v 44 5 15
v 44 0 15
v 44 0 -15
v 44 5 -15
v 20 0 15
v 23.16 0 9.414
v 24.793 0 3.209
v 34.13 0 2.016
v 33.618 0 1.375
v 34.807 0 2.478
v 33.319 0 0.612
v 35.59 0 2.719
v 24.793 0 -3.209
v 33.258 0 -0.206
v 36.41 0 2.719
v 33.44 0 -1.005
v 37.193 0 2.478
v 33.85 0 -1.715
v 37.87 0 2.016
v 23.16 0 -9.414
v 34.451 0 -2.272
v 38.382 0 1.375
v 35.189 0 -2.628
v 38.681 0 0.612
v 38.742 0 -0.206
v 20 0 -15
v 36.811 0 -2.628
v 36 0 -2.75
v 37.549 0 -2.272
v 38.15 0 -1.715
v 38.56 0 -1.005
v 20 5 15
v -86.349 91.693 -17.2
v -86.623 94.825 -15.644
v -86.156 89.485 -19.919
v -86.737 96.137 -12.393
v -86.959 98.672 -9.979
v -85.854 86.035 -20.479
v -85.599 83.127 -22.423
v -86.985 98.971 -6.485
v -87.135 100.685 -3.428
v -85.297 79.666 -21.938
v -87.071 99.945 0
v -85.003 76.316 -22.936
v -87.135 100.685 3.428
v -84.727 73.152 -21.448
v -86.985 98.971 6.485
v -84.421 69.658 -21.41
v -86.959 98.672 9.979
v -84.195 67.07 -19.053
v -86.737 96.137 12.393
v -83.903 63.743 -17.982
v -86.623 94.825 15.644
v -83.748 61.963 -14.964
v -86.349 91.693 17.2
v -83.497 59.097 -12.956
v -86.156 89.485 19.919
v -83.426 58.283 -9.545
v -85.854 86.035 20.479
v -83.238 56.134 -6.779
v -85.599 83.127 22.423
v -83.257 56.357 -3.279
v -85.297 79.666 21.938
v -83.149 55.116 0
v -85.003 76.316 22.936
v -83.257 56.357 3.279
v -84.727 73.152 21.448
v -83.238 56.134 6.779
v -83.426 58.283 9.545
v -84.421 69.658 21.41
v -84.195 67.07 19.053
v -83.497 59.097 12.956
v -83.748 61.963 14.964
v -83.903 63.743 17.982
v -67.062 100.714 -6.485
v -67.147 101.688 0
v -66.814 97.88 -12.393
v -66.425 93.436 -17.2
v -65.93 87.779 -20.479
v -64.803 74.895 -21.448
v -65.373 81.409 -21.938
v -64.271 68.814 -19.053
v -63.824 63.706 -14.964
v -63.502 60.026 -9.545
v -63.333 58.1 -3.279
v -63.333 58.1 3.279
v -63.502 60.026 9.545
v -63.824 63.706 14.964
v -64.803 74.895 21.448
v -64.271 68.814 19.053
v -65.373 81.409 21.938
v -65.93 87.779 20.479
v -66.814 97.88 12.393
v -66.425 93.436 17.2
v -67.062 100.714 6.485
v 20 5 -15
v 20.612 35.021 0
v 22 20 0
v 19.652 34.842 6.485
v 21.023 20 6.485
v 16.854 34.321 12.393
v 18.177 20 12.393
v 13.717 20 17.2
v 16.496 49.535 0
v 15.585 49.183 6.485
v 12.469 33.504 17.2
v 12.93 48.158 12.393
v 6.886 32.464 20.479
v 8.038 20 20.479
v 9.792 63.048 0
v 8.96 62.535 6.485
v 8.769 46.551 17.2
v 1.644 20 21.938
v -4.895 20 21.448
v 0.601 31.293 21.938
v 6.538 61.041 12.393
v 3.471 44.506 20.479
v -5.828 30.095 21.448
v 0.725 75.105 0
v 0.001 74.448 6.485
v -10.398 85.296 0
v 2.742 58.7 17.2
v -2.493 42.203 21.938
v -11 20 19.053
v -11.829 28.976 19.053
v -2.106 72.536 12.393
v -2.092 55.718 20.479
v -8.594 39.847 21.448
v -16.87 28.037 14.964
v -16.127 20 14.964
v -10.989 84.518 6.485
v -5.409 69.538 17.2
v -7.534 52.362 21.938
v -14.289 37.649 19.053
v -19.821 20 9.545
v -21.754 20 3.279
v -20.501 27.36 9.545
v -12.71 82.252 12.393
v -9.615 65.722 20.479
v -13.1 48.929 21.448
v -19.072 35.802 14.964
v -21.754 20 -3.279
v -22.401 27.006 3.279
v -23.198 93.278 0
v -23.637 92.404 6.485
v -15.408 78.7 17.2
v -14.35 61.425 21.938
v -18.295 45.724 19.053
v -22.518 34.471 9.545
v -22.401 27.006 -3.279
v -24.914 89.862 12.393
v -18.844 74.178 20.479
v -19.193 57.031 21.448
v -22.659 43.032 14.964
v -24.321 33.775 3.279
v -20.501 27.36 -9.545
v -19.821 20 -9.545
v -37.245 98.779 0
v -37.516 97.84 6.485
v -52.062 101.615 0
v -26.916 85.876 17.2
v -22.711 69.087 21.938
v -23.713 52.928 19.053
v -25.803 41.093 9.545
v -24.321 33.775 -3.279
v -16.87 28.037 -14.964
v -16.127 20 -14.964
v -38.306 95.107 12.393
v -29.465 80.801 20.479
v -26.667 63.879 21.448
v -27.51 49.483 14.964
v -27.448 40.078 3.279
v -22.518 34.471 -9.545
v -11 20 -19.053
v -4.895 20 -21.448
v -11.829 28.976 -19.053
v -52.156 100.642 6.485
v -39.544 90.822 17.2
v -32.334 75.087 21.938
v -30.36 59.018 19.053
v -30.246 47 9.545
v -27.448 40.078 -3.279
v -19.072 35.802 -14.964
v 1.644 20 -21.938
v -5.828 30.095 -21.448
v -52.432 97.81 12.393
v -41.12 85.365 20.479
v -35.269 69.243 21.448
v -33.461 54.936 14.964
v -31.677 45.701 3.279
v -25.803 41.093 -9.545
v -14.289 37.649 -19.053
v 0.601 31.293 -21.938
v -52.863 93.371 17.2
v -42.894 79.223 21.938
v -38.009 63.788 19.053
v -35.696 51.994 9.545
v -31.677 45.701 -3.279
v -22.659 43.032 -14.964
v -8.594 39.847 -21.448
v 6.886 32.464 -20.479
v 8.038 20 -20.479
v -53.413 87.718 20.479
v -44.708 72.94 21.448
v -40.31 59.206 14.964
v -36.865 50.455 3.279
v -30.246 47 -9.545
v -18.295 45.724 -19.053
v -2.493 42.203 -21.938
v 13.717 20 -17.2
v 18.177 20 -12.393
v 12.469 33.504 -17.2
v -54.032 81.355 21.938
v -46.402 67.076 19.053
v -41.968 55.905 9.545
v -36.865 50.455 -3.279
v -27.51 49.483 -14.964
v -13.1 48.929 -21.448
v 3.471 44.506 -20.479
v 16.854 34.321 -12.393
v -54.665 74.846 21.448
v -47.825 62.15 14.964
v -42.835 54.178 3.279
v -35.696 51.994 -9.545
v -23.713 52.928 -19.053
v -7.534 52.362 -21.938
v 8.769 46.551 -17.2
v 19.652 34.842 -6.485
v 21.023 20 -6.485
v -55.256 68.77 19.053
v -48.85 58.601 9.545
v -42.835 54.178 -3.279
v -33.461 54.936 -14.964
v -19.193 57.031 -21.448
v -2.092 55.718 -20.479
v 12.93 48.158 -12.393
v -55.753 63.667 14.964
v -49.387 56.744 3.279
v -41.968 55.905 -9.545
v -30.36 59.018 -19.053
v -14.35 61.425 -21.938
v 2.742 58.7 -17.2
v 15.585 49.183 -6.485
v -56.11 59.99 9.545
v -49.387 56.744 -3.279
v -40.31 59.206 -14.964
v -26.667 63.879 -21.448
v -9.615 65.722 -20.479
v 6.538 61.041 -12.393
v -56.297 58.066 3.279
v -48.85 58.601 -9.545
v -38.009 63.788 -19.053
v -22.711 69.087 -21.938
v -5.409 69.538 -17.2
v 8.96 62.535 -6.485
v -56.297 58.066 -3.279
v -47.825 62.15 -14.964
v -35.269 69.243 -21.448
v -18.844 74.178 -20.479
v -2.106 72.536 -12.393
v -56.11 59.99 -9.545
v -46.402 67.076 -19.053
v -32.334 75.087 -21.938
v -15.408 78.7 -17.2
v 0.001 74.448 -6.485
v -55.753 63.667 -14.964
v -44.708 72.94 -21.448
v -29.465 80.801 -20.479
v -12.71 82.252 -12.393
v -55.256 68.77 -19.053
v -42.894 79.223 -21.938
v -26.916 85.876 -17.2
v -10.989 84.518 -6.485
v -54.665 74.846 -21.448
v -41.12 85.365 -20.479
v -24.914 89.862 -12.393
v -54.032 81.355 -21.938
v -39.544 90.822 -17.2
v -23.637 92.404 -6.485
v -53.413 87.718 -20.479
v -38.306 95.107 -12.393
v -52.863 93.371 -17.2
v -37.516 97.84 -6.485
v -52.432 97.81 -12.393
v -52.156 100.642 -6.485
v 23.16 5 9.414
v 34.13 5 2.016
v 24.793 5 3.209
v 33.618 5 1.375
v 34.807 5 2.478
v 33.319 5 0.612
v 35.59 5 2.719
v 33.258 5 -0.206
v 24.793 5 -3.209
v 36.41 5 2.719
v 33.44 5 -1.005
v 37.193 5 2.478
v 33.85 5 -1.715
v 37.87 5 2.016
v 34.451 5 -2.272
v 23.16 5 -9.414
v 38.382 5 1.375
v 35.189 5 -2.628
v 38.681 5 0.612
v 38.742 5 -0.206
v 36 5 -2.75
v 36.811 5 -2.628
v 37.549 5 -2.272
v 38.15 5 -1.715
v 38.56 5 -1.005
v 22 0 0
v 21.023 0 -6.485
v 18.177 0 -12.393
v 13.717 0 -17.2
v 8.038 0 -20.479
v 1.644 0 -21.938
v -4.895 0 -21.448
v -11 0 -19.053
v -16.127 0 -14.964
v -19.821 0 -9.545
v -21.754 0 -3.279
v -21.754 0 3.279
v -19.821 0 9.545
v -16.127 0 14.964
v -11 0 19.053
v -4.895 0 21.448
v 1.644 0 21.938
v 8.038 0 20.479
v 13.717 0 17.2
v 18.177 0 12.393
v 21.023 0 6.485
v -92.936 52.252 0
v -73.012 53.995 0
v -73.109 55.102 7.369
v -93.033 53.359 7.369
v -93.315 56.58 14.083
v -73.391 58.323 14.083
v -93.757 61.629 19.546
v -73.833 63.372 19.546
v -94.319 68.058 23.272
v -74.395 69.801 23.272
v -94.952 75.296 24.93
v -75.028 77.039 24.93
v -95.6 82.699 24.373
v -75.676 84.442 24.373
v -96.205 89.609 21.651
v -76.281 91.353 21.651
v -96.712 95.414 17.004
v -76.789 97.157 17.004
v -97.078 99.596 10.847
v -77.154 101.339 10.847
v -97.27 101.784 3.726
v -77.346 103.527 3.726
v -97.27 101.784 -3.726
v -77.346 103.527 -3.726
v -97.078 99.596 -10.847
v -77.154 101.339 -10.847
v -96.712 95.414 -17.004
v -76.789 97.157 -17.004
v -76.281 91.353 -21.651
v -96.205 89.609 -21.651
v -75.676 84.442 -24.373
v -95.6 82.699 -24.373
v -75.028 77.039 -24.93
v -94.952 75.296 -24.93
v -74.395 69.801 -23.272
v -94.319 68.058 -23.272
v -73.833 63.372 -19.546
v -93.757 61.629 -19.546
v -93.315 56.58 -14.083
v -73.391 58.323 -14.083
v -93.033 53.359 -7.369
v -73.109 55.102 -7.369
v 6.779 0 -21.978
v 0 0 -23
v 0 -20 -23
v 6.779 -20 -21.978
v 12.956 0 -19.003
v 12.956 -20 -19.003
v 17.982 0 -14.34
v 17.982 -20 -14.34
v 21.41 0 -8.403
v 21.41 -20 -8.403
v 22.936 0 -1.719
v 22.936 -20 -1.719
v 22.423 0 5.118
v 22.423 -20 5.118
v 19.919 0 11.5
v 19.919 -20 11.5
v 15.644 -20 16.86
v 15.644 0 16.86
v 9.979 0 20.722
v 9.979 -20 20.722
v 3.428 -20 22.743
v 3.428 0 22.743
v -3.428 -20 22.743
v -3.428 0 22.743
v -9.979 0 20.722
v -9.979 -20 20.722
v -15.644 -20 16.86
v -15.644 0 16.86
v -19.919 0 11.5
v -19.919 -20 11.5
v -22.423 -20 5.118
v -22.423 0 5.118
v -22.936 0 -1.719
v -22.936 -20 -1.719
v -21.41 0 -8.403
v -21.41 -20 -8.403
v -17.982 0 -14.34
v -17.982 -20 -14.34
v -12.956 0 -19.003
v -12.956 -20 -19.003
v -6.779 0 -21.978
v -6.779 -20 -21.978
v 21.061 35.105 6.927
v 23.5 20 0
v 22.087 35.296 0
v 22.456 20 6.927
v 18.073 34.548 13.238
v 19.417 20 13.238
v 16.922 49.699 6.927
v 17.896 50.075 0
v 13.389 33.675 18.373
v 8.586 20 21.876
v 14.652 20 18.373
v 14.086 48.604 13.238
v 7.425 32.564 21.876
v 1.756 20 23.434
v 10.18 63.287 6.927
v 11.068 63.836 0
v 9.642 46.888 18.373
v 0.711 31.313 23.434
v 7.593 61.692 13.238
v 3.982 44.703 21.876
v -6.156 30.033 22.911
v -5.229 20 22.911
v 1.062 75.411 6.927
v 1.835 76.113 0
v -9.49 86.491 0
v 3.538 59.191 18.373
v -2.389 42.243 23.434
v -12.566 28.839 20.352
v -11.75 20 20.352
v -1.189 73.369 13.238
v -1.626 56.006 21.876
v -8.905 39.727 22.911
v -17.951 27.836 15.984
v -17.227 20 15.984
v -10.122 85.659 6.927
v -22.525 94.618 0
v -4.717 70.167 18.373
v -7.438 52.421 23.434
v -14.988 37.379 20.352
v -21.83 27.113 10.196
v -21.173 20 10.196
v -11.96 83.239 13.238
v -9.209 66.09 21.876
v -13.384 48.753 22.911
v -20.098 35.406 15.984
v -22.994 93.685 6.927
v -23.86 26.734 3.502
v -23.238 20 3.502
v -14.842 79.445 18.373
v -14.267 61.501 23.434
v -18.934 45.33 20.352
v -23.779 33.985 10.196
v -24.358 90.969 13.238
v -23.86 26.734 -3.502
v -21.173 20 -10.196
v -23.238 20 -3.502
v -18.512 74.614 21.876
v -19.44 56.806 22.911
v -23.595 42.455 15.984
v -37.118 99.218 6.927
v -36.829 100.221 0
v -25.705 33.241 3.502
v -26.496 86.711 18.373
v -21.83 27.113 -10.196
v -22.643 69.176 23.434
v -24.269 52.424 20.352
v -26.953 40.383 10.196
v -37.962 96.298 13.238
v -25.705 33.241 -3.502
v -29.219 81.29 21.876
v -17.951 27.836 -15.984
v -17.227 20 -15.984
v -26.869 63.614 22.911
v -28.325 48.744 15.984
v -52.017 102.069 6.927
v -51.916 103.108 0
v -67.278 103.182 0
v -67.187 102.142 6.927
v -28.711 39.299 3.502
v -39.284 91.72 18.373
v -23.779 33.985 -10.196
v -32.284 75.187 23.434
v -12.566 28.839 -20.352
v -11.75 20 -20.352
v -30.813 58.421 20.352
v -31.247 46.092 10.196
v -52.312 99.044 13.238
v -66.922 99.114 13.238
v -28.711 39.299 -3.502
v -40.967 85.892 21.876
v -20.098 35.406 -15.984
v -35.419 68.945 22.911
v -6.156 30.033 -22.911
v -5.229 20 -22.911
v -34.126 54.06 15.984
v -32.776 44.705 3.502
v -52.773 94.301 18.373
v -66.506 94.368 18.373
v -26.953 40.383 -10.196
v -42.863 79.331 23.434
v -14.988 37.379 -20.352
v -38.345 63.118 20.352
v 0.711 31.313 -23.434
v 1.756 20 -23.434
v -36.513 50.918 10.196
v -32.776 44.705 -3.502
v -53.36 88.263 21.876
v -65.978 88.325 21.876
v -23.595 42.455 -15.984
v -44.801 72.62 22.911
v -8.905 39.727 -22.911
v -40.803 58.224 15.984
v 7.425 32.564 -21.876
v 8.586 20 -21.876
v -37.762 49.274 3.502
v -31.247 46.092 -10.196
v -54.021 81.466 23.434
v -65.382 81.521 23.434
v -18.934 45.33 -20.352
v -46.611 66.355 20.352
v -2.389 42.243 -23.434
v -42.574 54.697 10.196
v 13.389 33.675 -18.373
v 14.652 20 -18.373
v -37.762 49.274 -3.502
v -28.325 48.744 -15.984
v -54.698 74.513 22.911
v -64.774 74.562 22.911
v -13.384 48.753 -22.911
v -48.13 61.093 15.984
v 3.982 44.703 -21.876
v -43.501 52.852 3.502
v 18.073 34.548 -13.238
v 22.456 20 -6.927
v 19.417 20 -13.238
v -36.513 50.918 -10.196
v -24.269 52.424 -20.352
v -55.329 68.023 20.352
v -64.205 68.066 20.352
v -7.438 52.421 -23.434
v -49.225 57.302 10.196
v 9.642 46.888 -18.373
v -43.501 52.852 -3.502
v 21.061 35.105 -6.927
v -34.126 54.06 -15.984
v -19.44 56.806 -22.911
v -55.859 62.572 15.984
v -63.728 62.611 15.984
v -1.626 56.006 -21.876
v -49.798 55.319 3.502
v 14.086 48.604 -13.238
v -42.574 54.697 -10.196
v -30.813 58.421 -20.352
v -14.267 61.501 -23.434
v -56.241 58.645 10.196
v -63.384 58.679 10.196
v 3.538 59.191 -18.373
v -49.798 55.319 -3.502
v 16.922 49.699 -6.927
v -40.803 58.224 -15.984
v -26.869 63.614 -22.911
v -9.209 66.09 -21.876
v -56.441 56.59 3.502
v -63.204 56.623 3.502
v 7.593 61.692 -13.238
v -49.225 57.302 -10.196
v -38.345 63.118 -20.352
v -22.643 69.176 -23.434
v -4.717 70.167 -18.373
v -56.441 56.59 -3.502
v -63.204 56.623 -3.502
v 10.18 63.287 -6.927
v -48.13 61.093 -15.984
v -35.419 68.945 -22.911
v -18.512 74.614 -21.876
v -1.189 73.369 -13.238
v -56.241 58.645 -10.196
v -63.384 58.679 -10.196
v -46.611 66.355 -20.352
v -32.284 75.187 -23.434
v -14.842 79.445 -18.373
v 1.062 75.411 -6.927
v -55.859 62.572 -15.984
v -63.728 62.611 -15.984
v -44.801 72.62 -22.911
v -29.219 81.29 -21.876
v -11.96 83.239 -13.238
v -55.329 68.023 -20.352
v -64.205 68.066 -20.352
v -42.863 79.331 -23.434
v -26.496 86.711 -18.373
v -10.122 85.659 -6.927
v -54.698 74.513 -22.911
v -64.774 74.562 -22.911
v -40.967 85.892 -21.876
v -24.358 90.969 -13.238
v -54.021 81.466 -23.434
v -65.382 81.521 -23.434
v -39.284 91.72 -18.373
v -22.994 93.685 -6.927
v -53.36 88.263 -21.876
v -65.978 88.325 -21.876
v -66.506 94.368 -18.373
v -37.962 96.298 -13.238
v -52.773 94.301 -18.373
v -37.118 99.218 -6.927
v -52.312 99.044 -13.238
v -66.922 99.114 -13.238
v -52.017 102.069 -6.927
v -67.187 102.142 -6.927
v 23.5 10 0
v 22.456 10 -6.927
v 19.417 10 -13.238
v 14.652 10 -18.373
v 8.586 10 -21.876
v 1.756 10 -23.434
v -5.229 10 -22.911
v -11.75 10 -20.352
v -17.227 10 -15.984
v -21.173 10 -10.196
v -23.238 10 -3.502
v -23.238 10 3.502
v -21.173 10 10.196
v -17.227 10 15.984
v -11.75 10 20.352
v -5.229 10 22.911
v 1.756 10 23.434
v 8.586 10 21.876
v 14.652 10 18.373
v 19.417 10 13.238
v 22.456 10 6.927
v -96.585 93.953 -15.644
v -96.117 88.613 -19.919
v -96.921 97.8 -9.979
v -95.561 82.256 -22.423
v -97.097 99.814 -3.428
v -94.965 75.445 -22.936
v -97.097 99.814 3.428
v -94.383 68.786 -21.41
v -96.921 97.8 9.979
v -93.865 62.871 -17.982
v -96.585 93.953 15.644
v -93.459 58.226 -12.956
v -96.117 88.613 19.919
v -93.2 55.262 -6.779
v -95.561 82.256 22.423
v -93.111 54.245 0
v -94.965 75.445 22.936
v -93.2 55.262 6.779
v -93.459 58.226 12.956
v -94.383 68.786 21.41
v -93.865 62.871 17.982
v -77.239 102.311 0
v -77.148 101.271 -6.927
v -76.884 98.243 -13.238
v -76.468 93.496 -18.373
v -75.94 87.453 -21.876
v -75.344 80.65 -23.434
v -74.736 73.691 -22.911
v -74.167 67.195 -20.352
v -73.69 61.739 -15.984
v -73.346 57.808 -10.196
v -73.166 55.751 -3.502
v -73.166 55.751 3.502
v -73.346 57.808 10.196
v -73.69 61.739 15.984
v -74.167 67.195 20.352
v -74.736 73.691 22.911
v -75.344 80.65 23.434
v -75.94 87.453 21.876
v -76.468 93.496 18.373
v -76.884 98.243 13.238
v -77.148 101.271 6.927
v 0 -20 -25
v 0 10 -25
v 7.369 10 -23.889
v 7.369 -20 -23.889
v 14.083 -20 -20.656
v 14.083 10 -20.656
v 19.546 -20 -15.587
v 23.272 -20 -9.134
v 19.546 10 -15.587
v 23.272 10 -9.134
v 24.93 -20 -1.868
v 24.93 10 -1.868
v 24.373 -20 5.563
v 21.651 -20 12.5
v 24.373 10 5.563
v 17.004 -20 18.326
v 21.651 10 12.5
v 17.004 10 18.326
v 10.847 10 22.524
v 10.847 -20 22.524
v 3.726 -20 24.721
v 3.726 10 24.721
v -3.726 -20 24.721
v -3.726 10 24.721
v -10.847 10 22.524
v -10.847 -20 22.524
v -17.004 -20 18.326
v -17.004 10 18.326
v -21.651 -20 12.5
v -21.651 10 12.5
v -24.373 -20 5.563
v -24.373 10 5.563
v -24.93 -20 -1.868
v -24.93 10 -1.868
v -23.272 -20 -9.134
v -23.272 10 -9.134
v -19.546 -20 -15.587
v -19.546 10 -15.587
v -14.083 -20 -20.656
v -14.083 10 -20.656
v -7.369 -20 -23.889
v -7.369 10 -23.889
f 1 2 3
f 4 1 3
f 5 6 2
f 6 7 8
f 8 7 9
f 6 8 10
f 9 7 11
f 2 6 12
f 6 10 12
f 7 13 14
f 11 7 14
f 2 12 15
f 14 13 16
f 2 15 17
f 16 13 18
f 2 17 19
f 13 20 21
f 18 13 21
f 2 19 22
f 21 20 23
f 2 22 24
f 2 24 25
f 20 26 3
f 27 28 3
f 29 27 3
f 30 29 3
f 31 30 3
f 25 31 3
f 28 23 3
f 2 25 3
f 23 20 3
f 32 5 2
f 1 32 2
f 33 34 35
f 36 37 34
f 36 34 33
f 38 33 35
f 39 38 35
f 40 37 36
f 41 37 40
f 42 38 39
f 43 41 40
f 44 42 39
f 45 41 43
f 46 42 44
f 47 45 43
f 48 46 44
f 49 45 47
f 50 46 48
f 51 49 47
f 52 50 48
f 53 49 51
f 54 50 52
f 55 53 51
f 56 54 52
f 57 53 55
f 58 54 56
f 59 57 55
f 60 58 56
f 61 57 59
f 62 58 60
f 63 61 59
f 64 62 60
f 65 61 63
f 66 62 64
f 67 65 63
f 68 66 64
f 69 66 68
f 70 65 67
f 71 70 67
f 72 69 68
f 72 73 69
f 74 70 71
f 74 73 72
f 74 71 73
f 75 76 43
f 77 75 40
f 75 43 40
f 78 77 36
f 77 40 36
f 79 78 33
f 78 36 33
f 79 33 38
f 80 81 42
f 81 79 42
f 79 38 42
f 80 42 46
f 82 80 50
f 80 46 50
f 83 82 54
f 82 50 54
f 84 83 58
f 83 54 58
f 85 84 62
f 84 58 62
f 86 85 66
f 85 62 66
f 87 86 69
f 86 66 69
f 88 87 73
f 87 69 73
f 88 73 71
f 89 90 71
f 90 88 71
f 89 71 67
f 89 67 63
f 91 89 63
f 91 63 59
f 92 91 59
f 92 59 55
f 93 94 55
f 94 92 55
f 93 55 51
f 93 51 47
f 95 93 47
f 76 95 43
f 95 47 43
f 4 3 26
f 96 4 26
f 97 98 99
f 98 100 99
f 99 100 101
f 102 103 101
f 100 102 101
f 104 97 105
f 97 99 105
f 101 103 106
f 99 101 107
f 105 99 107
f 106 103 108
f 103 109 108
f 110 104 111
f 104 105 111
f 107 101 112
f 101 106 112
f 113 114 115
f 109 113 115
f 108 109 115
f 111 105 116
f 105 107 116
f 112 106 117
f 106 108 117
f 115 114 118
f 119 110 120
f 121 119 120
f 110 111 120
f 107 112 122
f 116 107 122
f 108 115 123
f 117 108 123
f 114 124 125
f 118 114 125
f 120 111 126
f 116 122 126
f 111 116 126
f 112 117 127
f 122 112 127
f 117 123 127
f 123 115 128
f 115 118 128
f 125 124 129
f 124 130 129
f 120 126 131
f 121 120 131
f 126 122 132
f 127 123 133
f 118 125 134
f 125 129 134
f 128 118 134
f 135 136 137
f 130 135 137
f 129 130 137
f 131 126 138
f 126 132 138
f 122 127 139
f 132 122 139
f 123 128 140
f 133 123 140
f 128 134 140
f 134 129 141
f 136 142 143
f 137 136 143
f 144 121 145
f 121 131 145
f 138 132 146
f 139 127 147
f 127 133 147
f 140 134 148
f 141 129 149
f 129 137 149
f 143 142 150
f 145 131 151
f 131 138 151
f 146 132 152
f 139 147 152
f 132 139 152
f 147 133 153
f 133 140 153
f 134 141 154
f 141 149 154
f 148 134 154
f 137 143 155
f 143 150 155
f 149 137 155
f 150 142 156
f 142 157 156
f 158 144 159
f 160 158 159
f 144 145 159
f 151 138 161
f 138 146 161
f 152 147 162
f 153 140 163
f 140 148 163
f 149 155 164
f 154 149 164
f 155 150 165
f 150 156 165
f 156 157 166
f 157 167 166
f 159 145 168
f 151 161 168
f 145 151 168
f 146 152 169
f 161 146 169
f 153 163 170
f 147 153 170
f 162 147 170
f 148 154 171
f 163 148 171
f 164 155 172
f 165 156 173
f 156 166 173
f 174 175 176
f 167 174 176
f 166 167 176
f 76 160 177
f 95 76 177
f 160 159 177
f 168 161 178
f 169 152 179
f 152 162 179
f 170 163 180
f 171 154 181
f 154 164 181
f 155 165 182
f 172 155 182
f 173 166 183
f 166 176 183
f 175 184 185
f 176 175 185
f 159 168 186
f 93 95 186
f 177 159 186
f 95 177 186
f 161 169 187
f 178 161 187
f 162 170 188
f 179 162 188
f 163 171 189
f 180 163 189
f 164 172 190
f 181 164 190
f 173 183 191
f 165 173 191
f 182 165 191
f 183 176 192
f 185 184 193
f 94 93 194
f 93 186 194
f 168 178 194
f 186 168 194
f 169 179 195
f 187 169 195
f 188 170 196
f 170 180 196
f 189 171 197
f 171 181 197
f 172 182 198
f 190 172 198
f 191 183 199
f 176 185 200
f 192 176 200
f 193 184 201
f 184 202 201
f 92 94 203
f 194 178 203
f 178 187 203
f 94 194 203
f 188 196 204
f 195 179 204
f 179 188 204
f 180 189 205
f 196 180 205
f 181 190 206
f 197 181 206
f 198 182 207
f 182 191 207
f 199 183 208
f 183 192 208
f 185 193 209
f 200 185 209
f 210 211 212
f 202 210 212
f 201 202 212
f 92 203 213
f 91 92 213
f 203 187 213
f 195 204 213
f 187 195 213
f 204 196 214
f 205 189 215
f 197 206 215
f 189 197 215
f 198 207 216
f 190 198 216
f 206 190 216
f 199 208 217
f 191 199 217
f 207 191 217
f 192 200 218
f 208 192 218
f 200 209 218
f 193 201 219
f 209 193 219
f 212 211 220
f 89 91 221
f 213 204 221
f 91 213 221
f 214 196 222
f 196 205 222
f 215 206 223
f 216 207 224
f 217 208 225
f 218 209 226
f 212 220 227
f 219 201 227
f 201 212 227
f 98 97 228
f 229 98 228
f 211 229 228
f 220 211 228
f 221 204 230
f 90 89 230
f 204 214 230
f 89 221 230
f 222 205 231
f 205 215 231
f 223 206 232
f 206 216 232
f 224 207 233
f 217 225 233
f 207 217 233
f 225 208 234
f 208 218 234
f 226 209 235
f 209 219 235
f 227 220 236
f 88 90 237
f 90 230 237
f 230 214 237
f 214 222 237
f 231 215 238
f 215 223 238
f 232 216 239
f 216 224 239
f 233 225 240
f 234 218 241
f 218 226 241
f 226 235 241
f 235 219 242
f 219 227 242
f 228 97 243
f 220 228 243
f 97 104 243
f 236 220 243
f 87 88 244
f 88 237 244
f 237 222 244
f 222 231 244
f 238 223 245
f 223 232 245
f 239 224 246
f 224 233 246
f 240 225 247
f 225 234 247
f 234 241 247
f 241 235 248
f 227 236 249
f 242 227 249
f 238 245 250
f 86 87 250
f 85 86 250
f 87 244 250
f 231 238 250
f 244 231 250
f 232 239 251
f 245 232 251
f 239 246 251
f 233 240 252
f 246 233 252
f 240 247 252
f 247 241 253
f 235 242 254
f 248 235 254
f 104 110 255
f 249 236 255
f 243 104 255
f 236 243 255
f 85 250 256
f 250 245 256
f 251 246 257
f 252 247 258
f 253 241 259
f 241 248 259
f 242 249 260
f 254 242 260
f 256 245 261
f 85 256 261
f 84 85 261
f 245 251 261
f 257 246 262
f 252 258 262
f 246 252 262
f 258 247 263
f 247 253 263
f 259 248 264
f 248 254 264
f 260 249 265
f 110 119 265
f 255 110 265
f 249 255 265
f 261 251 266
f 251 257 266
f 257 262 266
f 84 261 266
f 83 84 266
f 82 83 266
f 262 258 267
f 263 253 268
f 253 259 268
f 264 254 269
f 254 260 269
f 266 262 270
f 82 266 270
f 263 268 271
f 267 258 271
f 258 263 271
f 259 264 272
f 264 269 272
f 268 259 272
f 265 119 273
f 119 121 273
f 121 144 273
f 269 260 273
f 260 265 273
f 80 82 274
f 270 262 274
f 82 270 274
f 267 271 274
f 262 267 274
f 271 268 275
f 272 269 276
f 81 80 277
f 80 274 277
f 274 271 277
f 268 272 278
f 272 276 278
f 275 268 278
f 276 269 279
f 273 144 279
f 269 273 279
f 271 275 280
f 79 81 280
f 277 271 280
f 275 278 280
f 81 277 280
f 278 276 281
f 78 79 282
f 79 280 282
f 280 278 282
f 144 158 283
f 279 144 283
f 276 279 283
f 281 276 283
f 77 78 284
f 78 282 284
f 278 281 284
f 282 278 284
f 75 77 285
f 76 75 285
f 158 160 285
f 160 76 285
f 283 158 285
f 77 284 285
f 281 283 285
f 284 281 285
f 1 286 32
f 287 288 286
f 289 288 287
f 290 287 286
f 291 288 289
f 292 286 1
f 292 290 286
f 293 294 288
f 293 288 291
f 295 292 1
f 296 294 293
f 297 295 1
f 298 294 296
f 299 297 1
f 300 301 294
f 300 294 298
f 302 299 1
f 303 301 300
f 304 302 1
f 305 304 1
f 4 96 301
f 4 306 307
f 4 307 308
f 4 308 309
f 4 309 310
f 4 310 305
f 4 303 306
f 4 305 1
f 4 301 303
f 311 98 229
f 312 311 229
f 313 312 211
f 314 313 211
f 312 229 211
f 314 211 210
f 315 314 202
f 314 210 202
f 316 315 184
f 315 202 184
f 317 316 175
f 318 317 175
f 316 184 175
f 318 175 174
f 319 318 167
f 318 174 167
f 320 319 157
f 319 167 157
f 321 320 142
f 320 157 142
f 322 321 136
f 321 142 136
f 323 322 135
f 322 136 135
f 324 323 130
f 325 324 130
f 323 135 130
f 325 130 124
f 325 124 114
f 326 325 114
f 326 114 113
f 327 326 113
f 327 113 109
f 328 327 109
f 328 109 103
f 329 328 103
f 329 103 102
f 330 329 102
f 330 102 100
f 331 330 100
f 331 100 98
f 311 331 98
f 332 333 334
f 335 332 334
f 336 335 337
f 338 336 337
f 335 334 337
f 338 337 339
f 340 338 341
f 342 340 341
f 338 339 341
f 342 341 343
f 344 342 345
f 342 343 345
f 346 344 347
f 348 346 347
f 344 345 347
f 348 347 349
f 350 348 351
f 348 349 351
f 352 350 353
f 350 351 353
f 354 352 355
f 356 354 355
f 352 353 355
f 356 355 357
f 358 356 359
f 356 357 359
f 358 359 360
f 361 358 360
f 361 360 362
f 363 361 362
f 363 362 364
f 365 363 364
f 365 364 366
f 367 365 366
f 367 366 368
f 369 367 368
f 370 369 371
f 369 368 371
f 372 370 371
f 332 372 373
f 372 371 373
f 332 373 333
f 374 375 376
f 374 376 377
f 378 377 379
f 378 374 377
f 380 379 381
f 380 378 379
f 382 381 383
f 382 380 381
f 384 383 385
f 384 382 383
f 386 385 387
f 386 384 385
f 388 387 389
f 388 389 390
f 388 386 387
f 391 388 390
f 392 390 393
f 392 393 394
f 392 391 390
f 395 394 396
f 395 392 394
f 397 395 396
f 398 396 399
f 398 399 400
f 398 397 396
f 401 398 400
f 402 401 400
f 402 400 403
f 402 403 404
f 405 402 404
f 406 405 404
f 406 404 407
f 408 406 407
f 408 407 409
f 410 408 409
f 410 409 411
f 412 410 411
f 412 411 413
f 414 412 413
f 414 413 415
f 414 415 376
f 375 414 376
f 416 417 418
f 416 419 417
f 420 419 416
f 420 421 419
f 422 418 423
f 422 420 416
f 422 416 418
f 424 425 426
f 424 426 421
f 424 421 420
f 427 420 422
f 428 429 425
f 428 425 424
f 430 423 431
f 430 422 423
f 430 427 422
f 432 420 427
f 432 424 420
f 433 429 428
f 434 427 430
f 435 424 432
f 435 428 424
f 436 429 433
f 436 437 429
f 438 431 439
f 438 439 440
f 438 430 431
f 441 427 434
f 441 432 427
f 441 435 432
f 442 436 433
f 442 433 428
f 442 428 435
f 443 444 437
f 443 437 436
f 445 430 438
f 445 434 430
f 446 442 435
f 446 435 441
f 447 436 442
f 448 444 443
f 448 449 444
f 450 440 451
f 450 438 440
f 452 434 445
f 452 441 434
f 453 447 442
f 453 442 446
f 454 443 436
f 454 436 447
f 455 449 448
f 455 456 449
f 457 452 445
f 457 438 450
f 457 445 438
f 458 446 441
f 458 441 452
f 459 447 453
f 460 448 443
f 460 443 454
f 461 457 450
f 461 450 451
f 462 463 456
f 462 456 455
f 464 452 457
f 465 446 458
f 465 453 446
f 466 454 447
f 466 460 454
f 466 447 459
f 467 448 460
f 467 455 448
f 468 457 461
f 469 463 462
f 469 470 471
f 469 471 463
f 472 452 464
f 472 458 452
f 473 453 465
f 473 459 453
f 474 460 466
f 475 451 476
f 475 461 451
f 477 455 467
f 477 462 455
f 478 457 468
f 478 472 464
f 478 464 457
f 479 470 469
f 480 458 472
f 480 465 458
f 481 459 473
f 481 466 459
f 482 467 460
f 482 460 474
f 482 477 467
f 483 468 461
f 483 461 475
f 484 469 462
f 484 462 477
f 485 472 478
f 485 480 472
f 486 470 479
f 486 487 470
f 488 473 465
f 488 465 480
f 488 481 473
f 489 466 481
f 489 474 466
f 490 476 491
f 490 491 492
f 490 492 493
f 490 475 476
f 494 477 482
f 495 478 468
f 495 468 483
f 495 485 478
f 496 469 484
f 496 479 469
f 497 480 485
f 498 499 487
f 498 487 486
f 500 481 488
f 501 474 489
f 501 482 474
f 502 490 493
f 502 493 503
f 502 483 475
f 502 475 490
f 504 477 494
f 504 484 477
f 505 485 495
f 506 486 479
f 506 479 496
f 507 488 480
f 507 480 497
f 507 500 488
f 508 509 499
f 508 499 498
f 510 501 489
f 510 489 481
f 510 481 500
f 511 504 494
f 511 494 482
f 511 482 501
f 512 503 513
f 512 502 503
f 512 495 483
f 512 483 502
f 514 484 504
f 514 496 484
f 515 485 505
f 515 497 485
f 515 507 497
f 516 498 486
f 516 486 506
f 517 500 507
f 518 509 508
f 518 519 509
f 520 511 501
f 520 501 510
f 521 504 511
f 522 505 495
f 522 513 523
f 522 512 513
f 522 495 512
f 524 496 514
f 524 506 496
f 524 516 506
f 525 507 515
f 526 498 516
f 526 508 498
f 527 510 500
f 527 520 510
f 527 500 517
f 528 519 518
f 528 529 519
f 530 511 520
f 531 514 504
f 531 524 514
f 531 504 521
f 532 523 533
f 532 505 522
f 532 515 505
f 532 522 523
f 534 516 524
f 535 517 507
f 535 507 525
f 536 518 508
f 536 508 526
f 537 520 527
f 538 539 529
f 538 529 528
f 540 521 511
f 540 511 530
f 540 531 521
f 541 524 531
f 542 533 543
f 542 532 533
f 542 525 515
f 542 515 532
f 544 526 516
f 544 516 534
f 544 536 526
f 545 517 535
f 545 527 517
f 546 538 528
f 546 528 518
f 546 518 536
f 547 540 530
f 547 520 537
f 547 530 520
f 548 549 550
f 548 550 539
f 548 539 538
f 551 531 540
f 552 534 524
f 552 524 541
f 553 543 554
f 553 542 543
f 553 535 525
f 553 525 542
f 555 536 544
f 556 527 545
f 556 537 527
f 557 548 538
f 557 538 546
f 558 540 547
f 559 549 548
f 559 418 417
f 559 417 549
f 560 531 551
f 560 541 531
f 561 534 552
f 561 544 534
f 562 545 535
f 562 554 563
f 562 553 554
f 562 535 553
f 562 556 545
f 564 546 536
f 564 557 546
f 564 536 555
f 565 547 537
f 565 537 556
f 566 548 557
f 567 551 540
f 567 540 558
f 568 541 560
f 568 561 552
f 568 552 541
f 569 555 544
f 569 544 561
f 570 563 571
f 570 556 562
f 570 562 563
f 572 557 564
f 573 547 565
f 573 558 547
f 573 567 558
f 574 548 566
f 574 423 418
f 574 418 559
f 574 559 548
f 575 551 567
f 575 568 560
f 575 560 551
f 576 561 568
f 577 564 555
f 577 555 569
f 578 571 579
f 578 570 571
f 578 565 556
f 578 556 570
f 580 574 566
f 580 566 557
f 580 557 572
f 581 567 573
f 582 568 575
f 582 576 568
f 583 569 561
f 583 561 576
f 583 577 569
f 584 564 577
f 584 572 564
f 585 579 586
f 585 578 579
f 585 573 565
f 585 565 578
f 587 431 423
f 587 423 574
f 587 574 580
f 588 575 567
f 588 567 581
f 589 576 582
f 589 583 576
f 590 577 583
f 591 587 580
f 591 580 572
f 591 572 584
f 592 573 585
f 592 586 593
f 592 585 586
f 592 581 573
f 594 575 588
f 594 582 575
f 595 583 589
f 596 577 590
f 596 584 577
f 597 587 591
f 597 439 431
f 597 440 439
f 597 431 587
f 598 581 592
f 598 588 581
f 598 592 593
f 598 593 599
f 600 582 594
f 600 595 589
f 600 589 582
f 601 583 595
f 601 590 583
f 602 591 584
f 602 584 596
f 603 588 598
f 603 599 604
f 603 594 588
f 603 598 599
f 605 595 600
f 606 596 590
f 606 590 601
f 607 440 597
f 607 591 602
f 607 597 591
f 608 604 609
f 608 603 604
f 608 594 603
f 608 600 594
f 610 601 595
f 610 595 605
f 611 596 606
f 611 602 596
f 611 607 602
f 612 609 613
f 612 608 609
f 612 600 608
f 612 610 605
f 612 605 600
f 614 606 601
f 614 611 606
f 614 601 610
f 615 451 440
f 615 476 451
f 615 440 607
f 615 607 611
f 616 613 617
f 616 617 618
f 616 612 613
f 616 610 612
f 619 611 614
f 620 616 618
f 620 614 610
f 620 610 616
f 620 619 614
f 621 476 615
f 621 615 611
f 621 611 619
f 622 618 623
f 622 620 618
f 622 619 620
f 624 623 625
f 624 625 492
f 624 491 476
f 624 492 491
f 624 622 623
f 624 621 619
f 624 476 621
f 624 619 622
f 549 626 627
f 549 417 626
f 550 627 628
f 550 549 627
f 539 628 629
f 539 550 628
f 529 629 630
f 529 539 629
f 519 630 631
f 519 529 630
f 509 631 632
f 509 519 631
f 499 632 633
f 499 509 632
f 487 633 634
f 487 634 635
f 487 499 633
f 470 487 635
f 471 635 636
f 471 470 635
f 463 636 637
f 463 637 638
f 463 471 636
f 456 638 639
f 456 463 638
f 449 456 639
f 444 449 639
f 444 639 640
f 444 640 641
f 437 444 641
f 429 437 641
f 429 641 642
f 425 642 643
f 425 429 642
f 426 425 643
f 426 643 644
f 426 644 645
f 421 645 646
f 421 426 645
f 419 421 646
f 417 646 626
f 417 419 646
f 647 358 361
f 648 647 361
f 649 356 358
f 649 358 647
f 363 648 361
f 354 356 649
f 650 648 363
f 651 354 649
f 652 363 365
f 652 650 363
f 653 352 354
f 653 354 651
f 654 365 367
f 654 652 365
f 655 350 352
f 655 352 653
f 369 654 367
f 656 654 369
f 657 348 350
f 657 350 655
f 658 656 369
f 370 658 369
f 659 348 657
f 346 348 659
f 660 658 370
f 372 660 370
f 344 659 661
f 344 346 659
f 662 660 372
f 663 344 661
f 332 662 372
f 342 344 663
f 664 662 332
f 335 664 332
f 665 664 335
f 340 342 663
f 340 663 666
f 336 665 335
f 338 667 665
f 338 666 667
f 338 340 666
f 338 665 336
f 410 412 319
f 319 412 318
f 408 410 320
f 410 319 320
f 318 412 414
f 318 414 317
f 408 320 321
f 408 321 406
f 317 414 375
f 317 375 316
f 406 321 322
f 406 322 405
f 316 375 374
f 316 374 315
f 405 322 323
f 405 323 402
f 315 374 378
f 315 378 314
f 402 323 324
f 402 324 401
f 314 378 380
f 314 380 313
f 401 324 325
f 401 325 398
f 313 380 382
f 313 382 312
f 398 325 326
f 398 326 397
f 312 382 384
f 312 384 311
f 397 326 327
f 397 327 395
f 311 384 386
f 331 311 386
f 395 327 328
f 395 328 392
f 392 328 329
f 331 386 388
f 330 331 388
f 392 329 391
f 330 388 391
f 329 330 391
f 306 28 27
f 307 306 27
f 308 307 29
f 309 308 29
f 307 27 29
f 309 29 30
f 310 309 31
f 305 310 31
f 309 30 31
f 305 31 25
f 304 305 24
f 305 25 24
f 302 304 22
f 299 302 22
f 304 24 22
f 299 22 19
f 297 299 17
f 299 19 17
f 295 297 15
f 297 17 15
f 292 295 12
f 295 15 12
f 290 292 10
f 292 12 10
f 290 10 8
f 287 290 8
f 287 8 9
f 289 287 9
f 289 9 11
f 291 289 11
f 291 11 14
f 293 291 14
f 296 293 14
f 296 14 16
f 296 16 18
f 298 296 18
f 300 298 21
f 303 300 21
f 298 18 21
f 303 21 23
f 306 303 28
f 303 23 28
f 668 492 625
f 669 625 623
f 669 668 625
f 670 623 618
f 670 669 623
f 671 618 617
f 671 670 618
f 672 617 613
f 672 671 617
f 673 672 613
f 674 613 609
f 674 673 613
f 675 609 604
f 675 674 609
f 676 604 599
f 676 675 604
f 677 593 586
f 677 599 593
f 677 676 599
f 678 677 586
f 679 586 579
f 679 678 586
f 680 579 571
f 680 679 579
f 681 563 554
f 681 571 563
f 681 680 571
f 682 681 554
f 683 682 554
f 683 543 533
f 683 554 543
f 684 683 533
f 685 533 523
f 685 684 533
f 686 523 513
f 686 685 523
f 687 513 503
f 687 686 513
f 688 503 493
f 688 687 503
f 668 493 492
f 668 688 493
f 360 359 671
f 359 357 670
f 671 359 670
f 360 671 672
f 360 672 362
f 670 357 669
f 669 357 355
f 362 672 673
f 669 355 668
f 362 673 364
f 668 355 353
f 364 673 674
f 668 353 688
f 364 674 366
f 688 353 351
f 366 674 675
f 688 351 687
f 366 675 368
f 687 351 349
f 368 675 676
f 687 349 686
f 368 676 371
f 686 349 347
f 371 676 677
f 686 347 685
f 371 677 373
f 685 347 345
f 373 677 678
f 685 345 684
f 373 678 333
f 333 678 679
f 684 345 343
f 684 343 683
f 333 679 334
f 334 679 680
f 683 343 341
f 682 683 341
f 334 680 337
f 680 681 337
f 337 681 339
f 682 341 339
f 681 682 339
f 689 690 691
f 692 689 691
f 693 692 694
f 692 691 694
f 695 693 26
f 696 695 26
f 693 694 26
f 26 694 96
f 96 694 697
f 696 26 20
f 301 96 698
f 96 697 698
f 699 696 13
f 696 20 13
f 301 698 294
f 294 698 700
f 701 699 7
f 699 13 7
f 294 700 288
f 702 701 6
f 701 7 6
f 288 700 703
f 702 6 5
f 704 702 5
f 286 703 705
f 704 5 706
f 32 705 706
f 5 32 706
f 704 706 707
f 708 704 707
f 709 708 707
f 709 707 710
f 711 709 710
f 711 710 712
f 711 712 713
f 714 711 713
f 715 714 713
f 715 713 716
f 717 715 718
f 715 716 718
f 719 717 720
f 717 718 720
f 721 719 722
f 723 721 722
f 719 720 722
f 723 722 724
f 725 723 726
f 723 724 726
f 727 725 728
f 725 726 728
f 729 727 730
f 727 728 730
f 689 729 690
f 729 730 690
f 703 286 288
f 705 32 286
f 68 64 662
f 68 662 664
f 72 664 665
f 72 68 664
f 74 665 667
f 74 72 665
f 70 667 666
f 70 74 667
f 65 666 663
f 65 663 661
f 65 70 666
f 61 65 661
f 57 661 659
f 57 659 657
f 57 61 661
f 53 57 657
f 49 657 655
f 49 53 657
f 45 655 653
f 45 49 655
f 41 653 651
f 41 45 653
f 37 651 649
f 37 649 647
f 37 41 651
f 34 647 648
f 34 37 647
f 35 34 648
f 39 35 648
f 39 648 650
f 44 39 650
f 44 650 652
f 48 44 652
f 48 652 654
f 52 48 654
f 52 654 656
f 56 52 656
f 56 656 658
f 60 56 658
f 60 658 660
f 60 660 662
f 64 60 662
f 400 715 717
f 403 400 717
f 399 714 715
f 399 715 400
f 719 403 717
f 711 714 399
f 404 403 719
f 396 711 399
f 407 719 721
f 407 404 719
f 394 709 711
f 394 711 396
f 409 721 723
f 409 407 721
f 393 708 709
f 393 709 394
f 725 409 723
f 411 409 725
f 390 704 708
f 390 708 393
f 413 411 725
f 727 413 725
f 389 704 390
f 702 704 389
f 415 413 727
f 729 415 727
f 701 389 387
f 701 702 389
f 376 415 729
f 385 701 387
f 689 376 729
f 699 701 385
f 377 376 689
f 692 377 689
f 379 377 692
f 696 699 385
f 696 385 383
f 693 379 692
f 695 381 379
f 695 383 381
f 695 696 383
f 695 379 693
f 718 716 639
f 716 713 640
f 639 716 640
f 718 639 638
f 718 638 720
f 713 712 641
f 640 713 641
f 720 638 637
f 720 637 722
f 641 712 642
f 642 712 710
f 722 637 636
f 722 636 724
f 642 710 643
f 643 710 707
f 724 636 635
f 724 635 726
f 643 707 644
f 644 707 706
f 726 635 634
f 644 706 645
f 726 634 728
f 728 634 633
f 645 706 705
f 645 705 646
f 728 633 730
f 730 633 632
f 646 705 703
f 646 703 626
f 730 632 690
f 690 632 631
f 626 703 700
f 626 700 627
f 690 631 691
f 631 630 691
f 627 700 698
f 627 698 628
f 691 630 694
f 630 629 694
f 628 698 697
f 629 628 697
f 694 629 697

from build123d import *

# Parameters (mm, degrees)
SKETCH_1_R           = 23.5
SKETCH_1_R_2         = 22
EXTRUDE_1_DEPTH      = 20
EXTRUDE_1_DEPTH_BACK = 10
SKETCH_3_R           = 25
SKETCH_3_R_2         = 23
EXTRUDE_2_DEPTH      = 10
EXTRUDE_2_DEPTH_BACK = 10
SKETCH_4_R           = 25
SKETCH_4_R_2         = 23
SKETCH_5_R           = 2.75
EXTRUDE_3_DEPTH      = 5


with BuildPart() as part:
    # 扫描1: sweep along a path in 草图2
    with BuildLine(Plane.XY) as sweep_1_path:
        Line((0, 0), (0, 20))
        ThreePointArc((0, 20), (-19.464587543, 64.236640209), (-65.229344565, 79.771681886))
        Line((-65.229344565, 79.771681886), (-85.153238527, 78.028567031))
    # 草图1 → 扫描1 (sweep)
    with BuildSketch(Plane(origin=(0, 0, 0), x_dir=(1, 0, 0), z_dir=(0, 1, 0))):
        Circle(SKETCH_1_R)
        Circle(SKETCH_1_R_2, mode=Mode.SUBTRACT)
    sweep(path=sweep_1_path.line)

    # 草图4 → 凸台-拉伸2 (add, two sides: drawn at the far end of the back side and taken through both)
    with BuildSketch(Plane(origin=(-77.731644776, -6.800637715, 0), x_dir=(0, 0, 1), z_dir=(-0.9961946980917464, -0.08715574274764801, 0)).offset(-EXTRUDE_2_DEPTH_BACK)):
        with Locations((0, 85.153238527)):
            Circle(SKETCH_4_R)
        with Locations((0, 85.153238527)):
            Circle(SKETCH_4_R_2, mode=Mode.SUBTRACT)
    extrude(amount=EXTRUDE_2_DEPTH + EXTRUDE_2_DEPTH_BACK)


with BuildPart() as body_2:
    # 草图3 → 凸台-拉伸1 (new, two sides: drawn at the far end of the back side and taken through both)
    with BuildSketch(Plane.XZ.offset(-EXTRUDE_1_DEPTH_BACK)):
        Circle(SKETCH_3_R)
        Circle(SKETCH_3_R_2, mode=Mode.SUBTRACT)
    extrude(amount=EXTRUDE_1_DEPTH + EXTRUDE_1_DEPTH_BACK)


    add(part.part)  # 凸台-拉伸3 merges part
    # 草图5 → 凸台-拉伸3 (add)
    with BuildSketch(Plane(origin=(0, 0, 0), x_dir=(-1, 0, 0), z_dir=(0, -1, 0))):
        with BuildLine():
            Line((-44, 15), (-20, 15))
            ThreePointArc((-20, 15), (-25, 0), (-20, -15))
            Line((-20, -15), (-44, -15))
            Line((-44, -15), (-44, 15))
        make_face()
        with Locations((-36, 0)):
            Circle(SKETCH_5_R, mode=Mode.SUBTRACT)
    extrude(amount=-EXTRUDE_3_DEPTH)


solid = body_2.part
